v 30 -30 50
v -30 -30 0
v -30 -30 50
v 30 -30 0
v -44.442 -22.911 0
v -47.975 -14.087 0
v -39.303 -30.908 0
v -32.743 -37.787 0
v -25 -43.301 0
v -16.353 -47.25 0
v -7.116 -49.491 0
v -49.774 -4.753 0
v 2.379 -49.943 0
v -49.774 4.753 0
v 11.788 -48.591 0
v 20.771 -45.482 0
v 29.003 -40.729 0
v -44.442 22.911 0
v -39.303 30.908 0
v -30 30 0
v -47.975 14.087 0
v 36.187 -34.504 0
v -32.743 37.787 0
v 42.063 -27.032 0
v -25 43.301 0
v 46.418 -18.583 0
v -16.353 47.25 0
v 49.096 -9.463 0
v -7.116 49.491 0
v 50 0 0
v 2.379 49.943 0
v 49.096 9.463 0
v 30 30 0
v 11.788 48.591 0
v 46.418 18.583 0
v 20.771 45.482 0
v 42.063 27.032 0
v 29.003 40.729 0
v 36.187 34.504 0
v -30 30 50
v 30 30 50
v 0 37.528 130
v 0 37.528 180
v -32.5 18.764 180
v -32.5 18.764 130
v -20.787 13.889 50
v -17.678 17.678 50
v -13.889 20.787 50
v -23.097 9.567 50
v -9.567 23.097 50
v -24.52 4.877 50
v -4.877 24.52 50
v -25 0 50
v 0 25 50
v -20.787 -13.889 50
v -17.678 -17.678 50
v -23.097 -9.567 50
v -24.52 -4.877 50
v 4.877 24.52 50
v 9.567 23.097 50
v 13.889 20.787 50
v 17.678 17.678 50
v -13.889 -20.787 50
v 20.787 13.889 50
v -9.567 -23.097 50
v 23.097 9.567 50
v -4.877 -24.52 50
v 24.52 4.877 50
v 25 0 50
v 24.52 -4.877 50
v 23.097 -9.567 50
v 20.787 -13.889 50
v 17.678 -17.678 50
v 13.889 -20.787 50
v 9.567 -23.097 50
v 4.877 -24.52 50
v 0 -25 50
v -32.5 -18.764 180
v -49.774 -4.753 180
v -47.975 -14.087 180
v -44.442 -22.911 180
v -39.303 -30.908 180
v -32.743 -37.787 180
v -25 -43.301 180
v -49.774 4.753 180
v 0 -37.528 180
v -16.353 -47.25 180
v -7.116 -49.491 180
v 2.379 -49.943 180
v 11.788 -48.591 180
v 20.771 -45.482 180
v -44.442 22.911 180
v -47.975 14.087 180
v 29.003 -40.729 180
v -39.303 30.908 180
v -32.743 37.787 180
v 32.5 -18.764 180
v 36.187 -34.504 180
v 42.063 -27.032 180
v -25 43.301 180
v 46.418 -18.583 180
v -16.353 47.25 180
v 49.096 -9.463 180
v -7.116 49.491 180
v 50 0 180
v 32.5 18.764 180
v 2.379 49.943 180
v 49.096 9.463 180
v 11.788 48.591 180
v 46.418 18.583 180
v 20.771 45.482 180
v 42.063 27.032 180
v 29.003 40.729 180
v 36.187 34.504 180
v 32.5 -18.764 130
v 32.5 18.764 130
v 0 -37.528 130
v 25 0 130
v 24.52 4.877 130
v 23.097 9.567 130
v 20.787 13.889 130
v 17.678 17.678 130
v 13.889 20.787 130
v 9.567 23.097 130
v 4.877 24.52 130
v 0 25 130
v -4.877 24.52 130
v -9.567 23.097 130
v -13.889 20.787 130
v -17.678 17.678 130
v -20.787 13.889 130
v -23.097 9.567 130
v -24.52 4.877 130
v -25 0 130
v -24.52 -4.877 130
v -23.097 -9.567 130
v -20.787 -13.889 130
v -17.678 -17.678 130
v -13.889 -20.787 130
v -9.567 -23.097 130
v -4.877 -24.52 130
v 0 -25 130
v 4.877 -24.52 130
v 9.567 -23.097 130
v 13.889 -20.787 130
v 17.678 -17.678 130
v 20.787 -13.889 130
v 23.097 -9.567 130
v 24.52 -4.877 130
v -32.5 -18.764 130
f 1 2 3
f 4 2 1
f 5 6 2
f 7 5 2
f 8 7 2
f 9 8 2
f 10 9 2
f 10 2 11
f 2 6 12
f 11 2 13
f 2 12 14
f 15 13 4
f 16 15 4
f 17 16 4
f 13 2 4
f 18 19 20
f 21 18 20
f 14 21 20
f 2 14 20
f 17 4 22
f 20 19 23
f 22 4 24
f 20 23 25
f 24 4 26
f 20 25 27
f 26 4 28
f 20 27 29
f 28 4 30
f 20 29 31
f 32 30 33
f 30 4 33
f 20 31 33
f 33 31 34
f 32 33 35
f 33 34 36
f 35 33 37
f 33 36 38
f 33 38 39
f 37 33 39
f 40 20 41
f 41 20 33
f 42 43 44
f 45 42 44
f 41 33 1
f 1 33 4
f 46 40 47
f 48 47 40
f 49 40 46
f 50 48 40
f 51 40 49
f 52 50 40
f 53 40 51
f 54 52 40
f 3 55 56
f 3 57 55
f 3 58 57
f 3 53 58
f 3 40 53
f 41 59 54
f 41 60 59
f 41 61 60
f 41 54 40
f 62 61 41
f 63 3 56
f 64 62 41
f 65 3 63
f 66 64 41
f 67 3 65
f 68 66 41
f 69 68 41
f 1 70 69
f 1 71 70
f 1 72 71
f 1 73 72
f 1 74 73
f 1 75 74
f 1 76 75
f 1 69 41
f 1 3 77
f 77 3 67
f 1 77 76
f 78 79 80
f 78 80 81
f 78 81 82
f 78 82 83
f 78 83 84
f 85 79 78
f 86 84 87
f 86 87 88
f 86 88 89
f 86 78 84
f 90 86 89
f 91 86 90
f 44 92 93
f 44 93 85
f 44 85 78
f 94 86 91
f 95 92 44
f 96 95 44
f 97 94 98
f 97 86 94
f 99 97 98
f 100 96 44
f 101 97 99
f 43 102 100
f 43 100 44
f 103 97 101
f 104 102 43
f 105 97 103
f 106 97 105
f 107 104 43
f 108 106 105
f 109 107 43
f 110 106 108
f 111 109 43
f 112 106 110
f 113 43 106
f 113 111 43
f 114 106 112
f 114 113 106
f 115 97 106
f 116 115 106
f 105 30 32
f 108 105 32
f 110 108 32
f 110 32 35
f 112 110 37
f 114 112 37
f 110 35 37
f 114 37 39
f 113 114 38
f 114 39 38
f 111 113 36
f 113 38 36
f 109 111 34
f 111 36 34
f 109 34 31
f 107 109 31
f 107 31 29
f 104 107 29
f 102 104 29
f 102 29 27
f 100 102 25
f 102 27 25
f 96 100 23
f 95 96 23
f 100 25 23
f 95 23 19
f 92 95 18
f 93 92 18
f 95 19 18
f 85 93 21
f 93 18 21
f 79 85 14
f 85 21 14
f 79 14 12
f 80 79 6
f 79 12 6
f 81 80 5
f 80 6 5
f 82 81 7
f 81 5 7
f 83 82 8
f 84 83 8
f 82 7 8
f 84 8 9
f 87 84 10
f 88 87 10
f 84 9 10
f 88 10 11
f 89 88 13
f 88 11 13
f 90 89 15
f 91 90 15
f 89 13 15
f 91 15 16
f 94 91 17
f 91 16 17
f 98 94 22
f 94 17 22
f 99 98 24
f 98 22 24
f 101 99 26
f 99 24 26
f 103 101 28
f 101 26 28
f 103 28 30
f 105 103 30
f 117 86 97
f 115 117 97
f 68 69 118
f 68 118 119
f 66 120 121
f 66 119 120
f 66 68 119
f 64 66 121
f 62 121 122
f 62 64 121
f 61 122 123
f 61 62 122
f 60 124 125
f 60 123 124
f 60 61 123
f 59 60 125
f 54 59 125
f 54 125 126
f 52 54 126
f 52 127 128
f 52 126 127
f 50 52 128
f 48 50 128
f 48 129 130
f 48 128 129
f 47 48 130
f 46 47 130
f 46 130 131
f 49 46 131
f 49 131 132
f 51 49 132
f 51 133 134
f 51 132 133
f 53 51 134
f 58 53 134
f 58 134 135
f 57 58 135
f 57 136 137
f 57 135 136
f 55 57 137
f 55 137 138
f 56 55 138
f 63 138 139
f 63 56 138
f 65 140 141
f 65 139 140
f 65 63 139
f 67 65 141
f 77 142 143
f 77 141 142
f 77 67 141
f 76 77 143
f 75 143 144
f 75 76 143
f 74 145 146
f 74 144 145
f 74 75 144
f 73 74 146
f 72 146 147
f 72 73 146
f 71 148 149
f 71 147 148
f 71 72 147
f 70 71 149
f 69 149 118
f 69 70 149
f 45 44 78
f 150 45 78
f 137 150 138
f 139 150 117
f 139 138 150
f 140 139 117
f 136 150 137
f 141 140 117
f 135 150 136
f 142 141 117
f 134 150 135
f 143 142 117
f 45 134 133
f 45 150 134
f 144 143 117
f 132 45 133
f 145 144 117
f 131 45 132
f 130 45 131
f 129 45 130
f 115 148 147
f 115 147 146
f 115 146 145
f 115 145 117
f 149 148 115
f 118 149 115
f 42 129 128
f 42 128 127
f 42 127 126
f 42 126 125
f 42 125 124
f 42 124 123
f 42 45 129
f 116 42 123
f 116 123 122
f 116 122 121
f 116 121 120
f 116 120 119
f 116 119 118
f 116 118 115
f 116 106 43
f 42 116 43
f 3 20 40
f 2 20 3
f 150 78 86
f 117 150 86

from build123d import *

# Parameters (mm, degrees)
F0_R     = 50
F1_DEPTH = 180
F2_R     = 25
F3_DEPTH = 180
F5_DEPTH = 50
F6_W     = 60
F6_H     = 60
F7_DEPTH = 50


with BuildPart() as f1:
    # F0 (on Top) → F1 (new body)
    with BuildSketch(Plane.XY):
        Circle(F0_R)
    extrude(amount=F1_DEPTH)

    # F2 (on Top) → F3 (cut, through all)
    with BuildSketch(Plane.XY):
        Circle(F2_R)
    extrude(amount=F3_DEPTH, mode=Mode.SUBTRACT)

    # F4 (on face) → F5 (cut)
    with BuildSketch(Plane.XY.offset(180)):
        Polygon((-32.5, 18.763884), (-32.5, -18.763884), (0, -37.527767), (32.5, -18.763884), (32.5, 18.763884), (0, 37.527767), align=None)
    extrude(amount=-F5_DEPTH, mode=Mode.SUBTRACT)

    # F6 (on face) → F7 (cut)
    with BuildSketch(Plane(origin=(0, 0, 0), x_dir=(1, 0, 0), z_dir=(0, 0, -1))):
        Rectangle(F6_W, F6_H)
    extrude(amount=-F7_DEPTH, mode=Mode.SUBTRACT)


solid = f1.part
